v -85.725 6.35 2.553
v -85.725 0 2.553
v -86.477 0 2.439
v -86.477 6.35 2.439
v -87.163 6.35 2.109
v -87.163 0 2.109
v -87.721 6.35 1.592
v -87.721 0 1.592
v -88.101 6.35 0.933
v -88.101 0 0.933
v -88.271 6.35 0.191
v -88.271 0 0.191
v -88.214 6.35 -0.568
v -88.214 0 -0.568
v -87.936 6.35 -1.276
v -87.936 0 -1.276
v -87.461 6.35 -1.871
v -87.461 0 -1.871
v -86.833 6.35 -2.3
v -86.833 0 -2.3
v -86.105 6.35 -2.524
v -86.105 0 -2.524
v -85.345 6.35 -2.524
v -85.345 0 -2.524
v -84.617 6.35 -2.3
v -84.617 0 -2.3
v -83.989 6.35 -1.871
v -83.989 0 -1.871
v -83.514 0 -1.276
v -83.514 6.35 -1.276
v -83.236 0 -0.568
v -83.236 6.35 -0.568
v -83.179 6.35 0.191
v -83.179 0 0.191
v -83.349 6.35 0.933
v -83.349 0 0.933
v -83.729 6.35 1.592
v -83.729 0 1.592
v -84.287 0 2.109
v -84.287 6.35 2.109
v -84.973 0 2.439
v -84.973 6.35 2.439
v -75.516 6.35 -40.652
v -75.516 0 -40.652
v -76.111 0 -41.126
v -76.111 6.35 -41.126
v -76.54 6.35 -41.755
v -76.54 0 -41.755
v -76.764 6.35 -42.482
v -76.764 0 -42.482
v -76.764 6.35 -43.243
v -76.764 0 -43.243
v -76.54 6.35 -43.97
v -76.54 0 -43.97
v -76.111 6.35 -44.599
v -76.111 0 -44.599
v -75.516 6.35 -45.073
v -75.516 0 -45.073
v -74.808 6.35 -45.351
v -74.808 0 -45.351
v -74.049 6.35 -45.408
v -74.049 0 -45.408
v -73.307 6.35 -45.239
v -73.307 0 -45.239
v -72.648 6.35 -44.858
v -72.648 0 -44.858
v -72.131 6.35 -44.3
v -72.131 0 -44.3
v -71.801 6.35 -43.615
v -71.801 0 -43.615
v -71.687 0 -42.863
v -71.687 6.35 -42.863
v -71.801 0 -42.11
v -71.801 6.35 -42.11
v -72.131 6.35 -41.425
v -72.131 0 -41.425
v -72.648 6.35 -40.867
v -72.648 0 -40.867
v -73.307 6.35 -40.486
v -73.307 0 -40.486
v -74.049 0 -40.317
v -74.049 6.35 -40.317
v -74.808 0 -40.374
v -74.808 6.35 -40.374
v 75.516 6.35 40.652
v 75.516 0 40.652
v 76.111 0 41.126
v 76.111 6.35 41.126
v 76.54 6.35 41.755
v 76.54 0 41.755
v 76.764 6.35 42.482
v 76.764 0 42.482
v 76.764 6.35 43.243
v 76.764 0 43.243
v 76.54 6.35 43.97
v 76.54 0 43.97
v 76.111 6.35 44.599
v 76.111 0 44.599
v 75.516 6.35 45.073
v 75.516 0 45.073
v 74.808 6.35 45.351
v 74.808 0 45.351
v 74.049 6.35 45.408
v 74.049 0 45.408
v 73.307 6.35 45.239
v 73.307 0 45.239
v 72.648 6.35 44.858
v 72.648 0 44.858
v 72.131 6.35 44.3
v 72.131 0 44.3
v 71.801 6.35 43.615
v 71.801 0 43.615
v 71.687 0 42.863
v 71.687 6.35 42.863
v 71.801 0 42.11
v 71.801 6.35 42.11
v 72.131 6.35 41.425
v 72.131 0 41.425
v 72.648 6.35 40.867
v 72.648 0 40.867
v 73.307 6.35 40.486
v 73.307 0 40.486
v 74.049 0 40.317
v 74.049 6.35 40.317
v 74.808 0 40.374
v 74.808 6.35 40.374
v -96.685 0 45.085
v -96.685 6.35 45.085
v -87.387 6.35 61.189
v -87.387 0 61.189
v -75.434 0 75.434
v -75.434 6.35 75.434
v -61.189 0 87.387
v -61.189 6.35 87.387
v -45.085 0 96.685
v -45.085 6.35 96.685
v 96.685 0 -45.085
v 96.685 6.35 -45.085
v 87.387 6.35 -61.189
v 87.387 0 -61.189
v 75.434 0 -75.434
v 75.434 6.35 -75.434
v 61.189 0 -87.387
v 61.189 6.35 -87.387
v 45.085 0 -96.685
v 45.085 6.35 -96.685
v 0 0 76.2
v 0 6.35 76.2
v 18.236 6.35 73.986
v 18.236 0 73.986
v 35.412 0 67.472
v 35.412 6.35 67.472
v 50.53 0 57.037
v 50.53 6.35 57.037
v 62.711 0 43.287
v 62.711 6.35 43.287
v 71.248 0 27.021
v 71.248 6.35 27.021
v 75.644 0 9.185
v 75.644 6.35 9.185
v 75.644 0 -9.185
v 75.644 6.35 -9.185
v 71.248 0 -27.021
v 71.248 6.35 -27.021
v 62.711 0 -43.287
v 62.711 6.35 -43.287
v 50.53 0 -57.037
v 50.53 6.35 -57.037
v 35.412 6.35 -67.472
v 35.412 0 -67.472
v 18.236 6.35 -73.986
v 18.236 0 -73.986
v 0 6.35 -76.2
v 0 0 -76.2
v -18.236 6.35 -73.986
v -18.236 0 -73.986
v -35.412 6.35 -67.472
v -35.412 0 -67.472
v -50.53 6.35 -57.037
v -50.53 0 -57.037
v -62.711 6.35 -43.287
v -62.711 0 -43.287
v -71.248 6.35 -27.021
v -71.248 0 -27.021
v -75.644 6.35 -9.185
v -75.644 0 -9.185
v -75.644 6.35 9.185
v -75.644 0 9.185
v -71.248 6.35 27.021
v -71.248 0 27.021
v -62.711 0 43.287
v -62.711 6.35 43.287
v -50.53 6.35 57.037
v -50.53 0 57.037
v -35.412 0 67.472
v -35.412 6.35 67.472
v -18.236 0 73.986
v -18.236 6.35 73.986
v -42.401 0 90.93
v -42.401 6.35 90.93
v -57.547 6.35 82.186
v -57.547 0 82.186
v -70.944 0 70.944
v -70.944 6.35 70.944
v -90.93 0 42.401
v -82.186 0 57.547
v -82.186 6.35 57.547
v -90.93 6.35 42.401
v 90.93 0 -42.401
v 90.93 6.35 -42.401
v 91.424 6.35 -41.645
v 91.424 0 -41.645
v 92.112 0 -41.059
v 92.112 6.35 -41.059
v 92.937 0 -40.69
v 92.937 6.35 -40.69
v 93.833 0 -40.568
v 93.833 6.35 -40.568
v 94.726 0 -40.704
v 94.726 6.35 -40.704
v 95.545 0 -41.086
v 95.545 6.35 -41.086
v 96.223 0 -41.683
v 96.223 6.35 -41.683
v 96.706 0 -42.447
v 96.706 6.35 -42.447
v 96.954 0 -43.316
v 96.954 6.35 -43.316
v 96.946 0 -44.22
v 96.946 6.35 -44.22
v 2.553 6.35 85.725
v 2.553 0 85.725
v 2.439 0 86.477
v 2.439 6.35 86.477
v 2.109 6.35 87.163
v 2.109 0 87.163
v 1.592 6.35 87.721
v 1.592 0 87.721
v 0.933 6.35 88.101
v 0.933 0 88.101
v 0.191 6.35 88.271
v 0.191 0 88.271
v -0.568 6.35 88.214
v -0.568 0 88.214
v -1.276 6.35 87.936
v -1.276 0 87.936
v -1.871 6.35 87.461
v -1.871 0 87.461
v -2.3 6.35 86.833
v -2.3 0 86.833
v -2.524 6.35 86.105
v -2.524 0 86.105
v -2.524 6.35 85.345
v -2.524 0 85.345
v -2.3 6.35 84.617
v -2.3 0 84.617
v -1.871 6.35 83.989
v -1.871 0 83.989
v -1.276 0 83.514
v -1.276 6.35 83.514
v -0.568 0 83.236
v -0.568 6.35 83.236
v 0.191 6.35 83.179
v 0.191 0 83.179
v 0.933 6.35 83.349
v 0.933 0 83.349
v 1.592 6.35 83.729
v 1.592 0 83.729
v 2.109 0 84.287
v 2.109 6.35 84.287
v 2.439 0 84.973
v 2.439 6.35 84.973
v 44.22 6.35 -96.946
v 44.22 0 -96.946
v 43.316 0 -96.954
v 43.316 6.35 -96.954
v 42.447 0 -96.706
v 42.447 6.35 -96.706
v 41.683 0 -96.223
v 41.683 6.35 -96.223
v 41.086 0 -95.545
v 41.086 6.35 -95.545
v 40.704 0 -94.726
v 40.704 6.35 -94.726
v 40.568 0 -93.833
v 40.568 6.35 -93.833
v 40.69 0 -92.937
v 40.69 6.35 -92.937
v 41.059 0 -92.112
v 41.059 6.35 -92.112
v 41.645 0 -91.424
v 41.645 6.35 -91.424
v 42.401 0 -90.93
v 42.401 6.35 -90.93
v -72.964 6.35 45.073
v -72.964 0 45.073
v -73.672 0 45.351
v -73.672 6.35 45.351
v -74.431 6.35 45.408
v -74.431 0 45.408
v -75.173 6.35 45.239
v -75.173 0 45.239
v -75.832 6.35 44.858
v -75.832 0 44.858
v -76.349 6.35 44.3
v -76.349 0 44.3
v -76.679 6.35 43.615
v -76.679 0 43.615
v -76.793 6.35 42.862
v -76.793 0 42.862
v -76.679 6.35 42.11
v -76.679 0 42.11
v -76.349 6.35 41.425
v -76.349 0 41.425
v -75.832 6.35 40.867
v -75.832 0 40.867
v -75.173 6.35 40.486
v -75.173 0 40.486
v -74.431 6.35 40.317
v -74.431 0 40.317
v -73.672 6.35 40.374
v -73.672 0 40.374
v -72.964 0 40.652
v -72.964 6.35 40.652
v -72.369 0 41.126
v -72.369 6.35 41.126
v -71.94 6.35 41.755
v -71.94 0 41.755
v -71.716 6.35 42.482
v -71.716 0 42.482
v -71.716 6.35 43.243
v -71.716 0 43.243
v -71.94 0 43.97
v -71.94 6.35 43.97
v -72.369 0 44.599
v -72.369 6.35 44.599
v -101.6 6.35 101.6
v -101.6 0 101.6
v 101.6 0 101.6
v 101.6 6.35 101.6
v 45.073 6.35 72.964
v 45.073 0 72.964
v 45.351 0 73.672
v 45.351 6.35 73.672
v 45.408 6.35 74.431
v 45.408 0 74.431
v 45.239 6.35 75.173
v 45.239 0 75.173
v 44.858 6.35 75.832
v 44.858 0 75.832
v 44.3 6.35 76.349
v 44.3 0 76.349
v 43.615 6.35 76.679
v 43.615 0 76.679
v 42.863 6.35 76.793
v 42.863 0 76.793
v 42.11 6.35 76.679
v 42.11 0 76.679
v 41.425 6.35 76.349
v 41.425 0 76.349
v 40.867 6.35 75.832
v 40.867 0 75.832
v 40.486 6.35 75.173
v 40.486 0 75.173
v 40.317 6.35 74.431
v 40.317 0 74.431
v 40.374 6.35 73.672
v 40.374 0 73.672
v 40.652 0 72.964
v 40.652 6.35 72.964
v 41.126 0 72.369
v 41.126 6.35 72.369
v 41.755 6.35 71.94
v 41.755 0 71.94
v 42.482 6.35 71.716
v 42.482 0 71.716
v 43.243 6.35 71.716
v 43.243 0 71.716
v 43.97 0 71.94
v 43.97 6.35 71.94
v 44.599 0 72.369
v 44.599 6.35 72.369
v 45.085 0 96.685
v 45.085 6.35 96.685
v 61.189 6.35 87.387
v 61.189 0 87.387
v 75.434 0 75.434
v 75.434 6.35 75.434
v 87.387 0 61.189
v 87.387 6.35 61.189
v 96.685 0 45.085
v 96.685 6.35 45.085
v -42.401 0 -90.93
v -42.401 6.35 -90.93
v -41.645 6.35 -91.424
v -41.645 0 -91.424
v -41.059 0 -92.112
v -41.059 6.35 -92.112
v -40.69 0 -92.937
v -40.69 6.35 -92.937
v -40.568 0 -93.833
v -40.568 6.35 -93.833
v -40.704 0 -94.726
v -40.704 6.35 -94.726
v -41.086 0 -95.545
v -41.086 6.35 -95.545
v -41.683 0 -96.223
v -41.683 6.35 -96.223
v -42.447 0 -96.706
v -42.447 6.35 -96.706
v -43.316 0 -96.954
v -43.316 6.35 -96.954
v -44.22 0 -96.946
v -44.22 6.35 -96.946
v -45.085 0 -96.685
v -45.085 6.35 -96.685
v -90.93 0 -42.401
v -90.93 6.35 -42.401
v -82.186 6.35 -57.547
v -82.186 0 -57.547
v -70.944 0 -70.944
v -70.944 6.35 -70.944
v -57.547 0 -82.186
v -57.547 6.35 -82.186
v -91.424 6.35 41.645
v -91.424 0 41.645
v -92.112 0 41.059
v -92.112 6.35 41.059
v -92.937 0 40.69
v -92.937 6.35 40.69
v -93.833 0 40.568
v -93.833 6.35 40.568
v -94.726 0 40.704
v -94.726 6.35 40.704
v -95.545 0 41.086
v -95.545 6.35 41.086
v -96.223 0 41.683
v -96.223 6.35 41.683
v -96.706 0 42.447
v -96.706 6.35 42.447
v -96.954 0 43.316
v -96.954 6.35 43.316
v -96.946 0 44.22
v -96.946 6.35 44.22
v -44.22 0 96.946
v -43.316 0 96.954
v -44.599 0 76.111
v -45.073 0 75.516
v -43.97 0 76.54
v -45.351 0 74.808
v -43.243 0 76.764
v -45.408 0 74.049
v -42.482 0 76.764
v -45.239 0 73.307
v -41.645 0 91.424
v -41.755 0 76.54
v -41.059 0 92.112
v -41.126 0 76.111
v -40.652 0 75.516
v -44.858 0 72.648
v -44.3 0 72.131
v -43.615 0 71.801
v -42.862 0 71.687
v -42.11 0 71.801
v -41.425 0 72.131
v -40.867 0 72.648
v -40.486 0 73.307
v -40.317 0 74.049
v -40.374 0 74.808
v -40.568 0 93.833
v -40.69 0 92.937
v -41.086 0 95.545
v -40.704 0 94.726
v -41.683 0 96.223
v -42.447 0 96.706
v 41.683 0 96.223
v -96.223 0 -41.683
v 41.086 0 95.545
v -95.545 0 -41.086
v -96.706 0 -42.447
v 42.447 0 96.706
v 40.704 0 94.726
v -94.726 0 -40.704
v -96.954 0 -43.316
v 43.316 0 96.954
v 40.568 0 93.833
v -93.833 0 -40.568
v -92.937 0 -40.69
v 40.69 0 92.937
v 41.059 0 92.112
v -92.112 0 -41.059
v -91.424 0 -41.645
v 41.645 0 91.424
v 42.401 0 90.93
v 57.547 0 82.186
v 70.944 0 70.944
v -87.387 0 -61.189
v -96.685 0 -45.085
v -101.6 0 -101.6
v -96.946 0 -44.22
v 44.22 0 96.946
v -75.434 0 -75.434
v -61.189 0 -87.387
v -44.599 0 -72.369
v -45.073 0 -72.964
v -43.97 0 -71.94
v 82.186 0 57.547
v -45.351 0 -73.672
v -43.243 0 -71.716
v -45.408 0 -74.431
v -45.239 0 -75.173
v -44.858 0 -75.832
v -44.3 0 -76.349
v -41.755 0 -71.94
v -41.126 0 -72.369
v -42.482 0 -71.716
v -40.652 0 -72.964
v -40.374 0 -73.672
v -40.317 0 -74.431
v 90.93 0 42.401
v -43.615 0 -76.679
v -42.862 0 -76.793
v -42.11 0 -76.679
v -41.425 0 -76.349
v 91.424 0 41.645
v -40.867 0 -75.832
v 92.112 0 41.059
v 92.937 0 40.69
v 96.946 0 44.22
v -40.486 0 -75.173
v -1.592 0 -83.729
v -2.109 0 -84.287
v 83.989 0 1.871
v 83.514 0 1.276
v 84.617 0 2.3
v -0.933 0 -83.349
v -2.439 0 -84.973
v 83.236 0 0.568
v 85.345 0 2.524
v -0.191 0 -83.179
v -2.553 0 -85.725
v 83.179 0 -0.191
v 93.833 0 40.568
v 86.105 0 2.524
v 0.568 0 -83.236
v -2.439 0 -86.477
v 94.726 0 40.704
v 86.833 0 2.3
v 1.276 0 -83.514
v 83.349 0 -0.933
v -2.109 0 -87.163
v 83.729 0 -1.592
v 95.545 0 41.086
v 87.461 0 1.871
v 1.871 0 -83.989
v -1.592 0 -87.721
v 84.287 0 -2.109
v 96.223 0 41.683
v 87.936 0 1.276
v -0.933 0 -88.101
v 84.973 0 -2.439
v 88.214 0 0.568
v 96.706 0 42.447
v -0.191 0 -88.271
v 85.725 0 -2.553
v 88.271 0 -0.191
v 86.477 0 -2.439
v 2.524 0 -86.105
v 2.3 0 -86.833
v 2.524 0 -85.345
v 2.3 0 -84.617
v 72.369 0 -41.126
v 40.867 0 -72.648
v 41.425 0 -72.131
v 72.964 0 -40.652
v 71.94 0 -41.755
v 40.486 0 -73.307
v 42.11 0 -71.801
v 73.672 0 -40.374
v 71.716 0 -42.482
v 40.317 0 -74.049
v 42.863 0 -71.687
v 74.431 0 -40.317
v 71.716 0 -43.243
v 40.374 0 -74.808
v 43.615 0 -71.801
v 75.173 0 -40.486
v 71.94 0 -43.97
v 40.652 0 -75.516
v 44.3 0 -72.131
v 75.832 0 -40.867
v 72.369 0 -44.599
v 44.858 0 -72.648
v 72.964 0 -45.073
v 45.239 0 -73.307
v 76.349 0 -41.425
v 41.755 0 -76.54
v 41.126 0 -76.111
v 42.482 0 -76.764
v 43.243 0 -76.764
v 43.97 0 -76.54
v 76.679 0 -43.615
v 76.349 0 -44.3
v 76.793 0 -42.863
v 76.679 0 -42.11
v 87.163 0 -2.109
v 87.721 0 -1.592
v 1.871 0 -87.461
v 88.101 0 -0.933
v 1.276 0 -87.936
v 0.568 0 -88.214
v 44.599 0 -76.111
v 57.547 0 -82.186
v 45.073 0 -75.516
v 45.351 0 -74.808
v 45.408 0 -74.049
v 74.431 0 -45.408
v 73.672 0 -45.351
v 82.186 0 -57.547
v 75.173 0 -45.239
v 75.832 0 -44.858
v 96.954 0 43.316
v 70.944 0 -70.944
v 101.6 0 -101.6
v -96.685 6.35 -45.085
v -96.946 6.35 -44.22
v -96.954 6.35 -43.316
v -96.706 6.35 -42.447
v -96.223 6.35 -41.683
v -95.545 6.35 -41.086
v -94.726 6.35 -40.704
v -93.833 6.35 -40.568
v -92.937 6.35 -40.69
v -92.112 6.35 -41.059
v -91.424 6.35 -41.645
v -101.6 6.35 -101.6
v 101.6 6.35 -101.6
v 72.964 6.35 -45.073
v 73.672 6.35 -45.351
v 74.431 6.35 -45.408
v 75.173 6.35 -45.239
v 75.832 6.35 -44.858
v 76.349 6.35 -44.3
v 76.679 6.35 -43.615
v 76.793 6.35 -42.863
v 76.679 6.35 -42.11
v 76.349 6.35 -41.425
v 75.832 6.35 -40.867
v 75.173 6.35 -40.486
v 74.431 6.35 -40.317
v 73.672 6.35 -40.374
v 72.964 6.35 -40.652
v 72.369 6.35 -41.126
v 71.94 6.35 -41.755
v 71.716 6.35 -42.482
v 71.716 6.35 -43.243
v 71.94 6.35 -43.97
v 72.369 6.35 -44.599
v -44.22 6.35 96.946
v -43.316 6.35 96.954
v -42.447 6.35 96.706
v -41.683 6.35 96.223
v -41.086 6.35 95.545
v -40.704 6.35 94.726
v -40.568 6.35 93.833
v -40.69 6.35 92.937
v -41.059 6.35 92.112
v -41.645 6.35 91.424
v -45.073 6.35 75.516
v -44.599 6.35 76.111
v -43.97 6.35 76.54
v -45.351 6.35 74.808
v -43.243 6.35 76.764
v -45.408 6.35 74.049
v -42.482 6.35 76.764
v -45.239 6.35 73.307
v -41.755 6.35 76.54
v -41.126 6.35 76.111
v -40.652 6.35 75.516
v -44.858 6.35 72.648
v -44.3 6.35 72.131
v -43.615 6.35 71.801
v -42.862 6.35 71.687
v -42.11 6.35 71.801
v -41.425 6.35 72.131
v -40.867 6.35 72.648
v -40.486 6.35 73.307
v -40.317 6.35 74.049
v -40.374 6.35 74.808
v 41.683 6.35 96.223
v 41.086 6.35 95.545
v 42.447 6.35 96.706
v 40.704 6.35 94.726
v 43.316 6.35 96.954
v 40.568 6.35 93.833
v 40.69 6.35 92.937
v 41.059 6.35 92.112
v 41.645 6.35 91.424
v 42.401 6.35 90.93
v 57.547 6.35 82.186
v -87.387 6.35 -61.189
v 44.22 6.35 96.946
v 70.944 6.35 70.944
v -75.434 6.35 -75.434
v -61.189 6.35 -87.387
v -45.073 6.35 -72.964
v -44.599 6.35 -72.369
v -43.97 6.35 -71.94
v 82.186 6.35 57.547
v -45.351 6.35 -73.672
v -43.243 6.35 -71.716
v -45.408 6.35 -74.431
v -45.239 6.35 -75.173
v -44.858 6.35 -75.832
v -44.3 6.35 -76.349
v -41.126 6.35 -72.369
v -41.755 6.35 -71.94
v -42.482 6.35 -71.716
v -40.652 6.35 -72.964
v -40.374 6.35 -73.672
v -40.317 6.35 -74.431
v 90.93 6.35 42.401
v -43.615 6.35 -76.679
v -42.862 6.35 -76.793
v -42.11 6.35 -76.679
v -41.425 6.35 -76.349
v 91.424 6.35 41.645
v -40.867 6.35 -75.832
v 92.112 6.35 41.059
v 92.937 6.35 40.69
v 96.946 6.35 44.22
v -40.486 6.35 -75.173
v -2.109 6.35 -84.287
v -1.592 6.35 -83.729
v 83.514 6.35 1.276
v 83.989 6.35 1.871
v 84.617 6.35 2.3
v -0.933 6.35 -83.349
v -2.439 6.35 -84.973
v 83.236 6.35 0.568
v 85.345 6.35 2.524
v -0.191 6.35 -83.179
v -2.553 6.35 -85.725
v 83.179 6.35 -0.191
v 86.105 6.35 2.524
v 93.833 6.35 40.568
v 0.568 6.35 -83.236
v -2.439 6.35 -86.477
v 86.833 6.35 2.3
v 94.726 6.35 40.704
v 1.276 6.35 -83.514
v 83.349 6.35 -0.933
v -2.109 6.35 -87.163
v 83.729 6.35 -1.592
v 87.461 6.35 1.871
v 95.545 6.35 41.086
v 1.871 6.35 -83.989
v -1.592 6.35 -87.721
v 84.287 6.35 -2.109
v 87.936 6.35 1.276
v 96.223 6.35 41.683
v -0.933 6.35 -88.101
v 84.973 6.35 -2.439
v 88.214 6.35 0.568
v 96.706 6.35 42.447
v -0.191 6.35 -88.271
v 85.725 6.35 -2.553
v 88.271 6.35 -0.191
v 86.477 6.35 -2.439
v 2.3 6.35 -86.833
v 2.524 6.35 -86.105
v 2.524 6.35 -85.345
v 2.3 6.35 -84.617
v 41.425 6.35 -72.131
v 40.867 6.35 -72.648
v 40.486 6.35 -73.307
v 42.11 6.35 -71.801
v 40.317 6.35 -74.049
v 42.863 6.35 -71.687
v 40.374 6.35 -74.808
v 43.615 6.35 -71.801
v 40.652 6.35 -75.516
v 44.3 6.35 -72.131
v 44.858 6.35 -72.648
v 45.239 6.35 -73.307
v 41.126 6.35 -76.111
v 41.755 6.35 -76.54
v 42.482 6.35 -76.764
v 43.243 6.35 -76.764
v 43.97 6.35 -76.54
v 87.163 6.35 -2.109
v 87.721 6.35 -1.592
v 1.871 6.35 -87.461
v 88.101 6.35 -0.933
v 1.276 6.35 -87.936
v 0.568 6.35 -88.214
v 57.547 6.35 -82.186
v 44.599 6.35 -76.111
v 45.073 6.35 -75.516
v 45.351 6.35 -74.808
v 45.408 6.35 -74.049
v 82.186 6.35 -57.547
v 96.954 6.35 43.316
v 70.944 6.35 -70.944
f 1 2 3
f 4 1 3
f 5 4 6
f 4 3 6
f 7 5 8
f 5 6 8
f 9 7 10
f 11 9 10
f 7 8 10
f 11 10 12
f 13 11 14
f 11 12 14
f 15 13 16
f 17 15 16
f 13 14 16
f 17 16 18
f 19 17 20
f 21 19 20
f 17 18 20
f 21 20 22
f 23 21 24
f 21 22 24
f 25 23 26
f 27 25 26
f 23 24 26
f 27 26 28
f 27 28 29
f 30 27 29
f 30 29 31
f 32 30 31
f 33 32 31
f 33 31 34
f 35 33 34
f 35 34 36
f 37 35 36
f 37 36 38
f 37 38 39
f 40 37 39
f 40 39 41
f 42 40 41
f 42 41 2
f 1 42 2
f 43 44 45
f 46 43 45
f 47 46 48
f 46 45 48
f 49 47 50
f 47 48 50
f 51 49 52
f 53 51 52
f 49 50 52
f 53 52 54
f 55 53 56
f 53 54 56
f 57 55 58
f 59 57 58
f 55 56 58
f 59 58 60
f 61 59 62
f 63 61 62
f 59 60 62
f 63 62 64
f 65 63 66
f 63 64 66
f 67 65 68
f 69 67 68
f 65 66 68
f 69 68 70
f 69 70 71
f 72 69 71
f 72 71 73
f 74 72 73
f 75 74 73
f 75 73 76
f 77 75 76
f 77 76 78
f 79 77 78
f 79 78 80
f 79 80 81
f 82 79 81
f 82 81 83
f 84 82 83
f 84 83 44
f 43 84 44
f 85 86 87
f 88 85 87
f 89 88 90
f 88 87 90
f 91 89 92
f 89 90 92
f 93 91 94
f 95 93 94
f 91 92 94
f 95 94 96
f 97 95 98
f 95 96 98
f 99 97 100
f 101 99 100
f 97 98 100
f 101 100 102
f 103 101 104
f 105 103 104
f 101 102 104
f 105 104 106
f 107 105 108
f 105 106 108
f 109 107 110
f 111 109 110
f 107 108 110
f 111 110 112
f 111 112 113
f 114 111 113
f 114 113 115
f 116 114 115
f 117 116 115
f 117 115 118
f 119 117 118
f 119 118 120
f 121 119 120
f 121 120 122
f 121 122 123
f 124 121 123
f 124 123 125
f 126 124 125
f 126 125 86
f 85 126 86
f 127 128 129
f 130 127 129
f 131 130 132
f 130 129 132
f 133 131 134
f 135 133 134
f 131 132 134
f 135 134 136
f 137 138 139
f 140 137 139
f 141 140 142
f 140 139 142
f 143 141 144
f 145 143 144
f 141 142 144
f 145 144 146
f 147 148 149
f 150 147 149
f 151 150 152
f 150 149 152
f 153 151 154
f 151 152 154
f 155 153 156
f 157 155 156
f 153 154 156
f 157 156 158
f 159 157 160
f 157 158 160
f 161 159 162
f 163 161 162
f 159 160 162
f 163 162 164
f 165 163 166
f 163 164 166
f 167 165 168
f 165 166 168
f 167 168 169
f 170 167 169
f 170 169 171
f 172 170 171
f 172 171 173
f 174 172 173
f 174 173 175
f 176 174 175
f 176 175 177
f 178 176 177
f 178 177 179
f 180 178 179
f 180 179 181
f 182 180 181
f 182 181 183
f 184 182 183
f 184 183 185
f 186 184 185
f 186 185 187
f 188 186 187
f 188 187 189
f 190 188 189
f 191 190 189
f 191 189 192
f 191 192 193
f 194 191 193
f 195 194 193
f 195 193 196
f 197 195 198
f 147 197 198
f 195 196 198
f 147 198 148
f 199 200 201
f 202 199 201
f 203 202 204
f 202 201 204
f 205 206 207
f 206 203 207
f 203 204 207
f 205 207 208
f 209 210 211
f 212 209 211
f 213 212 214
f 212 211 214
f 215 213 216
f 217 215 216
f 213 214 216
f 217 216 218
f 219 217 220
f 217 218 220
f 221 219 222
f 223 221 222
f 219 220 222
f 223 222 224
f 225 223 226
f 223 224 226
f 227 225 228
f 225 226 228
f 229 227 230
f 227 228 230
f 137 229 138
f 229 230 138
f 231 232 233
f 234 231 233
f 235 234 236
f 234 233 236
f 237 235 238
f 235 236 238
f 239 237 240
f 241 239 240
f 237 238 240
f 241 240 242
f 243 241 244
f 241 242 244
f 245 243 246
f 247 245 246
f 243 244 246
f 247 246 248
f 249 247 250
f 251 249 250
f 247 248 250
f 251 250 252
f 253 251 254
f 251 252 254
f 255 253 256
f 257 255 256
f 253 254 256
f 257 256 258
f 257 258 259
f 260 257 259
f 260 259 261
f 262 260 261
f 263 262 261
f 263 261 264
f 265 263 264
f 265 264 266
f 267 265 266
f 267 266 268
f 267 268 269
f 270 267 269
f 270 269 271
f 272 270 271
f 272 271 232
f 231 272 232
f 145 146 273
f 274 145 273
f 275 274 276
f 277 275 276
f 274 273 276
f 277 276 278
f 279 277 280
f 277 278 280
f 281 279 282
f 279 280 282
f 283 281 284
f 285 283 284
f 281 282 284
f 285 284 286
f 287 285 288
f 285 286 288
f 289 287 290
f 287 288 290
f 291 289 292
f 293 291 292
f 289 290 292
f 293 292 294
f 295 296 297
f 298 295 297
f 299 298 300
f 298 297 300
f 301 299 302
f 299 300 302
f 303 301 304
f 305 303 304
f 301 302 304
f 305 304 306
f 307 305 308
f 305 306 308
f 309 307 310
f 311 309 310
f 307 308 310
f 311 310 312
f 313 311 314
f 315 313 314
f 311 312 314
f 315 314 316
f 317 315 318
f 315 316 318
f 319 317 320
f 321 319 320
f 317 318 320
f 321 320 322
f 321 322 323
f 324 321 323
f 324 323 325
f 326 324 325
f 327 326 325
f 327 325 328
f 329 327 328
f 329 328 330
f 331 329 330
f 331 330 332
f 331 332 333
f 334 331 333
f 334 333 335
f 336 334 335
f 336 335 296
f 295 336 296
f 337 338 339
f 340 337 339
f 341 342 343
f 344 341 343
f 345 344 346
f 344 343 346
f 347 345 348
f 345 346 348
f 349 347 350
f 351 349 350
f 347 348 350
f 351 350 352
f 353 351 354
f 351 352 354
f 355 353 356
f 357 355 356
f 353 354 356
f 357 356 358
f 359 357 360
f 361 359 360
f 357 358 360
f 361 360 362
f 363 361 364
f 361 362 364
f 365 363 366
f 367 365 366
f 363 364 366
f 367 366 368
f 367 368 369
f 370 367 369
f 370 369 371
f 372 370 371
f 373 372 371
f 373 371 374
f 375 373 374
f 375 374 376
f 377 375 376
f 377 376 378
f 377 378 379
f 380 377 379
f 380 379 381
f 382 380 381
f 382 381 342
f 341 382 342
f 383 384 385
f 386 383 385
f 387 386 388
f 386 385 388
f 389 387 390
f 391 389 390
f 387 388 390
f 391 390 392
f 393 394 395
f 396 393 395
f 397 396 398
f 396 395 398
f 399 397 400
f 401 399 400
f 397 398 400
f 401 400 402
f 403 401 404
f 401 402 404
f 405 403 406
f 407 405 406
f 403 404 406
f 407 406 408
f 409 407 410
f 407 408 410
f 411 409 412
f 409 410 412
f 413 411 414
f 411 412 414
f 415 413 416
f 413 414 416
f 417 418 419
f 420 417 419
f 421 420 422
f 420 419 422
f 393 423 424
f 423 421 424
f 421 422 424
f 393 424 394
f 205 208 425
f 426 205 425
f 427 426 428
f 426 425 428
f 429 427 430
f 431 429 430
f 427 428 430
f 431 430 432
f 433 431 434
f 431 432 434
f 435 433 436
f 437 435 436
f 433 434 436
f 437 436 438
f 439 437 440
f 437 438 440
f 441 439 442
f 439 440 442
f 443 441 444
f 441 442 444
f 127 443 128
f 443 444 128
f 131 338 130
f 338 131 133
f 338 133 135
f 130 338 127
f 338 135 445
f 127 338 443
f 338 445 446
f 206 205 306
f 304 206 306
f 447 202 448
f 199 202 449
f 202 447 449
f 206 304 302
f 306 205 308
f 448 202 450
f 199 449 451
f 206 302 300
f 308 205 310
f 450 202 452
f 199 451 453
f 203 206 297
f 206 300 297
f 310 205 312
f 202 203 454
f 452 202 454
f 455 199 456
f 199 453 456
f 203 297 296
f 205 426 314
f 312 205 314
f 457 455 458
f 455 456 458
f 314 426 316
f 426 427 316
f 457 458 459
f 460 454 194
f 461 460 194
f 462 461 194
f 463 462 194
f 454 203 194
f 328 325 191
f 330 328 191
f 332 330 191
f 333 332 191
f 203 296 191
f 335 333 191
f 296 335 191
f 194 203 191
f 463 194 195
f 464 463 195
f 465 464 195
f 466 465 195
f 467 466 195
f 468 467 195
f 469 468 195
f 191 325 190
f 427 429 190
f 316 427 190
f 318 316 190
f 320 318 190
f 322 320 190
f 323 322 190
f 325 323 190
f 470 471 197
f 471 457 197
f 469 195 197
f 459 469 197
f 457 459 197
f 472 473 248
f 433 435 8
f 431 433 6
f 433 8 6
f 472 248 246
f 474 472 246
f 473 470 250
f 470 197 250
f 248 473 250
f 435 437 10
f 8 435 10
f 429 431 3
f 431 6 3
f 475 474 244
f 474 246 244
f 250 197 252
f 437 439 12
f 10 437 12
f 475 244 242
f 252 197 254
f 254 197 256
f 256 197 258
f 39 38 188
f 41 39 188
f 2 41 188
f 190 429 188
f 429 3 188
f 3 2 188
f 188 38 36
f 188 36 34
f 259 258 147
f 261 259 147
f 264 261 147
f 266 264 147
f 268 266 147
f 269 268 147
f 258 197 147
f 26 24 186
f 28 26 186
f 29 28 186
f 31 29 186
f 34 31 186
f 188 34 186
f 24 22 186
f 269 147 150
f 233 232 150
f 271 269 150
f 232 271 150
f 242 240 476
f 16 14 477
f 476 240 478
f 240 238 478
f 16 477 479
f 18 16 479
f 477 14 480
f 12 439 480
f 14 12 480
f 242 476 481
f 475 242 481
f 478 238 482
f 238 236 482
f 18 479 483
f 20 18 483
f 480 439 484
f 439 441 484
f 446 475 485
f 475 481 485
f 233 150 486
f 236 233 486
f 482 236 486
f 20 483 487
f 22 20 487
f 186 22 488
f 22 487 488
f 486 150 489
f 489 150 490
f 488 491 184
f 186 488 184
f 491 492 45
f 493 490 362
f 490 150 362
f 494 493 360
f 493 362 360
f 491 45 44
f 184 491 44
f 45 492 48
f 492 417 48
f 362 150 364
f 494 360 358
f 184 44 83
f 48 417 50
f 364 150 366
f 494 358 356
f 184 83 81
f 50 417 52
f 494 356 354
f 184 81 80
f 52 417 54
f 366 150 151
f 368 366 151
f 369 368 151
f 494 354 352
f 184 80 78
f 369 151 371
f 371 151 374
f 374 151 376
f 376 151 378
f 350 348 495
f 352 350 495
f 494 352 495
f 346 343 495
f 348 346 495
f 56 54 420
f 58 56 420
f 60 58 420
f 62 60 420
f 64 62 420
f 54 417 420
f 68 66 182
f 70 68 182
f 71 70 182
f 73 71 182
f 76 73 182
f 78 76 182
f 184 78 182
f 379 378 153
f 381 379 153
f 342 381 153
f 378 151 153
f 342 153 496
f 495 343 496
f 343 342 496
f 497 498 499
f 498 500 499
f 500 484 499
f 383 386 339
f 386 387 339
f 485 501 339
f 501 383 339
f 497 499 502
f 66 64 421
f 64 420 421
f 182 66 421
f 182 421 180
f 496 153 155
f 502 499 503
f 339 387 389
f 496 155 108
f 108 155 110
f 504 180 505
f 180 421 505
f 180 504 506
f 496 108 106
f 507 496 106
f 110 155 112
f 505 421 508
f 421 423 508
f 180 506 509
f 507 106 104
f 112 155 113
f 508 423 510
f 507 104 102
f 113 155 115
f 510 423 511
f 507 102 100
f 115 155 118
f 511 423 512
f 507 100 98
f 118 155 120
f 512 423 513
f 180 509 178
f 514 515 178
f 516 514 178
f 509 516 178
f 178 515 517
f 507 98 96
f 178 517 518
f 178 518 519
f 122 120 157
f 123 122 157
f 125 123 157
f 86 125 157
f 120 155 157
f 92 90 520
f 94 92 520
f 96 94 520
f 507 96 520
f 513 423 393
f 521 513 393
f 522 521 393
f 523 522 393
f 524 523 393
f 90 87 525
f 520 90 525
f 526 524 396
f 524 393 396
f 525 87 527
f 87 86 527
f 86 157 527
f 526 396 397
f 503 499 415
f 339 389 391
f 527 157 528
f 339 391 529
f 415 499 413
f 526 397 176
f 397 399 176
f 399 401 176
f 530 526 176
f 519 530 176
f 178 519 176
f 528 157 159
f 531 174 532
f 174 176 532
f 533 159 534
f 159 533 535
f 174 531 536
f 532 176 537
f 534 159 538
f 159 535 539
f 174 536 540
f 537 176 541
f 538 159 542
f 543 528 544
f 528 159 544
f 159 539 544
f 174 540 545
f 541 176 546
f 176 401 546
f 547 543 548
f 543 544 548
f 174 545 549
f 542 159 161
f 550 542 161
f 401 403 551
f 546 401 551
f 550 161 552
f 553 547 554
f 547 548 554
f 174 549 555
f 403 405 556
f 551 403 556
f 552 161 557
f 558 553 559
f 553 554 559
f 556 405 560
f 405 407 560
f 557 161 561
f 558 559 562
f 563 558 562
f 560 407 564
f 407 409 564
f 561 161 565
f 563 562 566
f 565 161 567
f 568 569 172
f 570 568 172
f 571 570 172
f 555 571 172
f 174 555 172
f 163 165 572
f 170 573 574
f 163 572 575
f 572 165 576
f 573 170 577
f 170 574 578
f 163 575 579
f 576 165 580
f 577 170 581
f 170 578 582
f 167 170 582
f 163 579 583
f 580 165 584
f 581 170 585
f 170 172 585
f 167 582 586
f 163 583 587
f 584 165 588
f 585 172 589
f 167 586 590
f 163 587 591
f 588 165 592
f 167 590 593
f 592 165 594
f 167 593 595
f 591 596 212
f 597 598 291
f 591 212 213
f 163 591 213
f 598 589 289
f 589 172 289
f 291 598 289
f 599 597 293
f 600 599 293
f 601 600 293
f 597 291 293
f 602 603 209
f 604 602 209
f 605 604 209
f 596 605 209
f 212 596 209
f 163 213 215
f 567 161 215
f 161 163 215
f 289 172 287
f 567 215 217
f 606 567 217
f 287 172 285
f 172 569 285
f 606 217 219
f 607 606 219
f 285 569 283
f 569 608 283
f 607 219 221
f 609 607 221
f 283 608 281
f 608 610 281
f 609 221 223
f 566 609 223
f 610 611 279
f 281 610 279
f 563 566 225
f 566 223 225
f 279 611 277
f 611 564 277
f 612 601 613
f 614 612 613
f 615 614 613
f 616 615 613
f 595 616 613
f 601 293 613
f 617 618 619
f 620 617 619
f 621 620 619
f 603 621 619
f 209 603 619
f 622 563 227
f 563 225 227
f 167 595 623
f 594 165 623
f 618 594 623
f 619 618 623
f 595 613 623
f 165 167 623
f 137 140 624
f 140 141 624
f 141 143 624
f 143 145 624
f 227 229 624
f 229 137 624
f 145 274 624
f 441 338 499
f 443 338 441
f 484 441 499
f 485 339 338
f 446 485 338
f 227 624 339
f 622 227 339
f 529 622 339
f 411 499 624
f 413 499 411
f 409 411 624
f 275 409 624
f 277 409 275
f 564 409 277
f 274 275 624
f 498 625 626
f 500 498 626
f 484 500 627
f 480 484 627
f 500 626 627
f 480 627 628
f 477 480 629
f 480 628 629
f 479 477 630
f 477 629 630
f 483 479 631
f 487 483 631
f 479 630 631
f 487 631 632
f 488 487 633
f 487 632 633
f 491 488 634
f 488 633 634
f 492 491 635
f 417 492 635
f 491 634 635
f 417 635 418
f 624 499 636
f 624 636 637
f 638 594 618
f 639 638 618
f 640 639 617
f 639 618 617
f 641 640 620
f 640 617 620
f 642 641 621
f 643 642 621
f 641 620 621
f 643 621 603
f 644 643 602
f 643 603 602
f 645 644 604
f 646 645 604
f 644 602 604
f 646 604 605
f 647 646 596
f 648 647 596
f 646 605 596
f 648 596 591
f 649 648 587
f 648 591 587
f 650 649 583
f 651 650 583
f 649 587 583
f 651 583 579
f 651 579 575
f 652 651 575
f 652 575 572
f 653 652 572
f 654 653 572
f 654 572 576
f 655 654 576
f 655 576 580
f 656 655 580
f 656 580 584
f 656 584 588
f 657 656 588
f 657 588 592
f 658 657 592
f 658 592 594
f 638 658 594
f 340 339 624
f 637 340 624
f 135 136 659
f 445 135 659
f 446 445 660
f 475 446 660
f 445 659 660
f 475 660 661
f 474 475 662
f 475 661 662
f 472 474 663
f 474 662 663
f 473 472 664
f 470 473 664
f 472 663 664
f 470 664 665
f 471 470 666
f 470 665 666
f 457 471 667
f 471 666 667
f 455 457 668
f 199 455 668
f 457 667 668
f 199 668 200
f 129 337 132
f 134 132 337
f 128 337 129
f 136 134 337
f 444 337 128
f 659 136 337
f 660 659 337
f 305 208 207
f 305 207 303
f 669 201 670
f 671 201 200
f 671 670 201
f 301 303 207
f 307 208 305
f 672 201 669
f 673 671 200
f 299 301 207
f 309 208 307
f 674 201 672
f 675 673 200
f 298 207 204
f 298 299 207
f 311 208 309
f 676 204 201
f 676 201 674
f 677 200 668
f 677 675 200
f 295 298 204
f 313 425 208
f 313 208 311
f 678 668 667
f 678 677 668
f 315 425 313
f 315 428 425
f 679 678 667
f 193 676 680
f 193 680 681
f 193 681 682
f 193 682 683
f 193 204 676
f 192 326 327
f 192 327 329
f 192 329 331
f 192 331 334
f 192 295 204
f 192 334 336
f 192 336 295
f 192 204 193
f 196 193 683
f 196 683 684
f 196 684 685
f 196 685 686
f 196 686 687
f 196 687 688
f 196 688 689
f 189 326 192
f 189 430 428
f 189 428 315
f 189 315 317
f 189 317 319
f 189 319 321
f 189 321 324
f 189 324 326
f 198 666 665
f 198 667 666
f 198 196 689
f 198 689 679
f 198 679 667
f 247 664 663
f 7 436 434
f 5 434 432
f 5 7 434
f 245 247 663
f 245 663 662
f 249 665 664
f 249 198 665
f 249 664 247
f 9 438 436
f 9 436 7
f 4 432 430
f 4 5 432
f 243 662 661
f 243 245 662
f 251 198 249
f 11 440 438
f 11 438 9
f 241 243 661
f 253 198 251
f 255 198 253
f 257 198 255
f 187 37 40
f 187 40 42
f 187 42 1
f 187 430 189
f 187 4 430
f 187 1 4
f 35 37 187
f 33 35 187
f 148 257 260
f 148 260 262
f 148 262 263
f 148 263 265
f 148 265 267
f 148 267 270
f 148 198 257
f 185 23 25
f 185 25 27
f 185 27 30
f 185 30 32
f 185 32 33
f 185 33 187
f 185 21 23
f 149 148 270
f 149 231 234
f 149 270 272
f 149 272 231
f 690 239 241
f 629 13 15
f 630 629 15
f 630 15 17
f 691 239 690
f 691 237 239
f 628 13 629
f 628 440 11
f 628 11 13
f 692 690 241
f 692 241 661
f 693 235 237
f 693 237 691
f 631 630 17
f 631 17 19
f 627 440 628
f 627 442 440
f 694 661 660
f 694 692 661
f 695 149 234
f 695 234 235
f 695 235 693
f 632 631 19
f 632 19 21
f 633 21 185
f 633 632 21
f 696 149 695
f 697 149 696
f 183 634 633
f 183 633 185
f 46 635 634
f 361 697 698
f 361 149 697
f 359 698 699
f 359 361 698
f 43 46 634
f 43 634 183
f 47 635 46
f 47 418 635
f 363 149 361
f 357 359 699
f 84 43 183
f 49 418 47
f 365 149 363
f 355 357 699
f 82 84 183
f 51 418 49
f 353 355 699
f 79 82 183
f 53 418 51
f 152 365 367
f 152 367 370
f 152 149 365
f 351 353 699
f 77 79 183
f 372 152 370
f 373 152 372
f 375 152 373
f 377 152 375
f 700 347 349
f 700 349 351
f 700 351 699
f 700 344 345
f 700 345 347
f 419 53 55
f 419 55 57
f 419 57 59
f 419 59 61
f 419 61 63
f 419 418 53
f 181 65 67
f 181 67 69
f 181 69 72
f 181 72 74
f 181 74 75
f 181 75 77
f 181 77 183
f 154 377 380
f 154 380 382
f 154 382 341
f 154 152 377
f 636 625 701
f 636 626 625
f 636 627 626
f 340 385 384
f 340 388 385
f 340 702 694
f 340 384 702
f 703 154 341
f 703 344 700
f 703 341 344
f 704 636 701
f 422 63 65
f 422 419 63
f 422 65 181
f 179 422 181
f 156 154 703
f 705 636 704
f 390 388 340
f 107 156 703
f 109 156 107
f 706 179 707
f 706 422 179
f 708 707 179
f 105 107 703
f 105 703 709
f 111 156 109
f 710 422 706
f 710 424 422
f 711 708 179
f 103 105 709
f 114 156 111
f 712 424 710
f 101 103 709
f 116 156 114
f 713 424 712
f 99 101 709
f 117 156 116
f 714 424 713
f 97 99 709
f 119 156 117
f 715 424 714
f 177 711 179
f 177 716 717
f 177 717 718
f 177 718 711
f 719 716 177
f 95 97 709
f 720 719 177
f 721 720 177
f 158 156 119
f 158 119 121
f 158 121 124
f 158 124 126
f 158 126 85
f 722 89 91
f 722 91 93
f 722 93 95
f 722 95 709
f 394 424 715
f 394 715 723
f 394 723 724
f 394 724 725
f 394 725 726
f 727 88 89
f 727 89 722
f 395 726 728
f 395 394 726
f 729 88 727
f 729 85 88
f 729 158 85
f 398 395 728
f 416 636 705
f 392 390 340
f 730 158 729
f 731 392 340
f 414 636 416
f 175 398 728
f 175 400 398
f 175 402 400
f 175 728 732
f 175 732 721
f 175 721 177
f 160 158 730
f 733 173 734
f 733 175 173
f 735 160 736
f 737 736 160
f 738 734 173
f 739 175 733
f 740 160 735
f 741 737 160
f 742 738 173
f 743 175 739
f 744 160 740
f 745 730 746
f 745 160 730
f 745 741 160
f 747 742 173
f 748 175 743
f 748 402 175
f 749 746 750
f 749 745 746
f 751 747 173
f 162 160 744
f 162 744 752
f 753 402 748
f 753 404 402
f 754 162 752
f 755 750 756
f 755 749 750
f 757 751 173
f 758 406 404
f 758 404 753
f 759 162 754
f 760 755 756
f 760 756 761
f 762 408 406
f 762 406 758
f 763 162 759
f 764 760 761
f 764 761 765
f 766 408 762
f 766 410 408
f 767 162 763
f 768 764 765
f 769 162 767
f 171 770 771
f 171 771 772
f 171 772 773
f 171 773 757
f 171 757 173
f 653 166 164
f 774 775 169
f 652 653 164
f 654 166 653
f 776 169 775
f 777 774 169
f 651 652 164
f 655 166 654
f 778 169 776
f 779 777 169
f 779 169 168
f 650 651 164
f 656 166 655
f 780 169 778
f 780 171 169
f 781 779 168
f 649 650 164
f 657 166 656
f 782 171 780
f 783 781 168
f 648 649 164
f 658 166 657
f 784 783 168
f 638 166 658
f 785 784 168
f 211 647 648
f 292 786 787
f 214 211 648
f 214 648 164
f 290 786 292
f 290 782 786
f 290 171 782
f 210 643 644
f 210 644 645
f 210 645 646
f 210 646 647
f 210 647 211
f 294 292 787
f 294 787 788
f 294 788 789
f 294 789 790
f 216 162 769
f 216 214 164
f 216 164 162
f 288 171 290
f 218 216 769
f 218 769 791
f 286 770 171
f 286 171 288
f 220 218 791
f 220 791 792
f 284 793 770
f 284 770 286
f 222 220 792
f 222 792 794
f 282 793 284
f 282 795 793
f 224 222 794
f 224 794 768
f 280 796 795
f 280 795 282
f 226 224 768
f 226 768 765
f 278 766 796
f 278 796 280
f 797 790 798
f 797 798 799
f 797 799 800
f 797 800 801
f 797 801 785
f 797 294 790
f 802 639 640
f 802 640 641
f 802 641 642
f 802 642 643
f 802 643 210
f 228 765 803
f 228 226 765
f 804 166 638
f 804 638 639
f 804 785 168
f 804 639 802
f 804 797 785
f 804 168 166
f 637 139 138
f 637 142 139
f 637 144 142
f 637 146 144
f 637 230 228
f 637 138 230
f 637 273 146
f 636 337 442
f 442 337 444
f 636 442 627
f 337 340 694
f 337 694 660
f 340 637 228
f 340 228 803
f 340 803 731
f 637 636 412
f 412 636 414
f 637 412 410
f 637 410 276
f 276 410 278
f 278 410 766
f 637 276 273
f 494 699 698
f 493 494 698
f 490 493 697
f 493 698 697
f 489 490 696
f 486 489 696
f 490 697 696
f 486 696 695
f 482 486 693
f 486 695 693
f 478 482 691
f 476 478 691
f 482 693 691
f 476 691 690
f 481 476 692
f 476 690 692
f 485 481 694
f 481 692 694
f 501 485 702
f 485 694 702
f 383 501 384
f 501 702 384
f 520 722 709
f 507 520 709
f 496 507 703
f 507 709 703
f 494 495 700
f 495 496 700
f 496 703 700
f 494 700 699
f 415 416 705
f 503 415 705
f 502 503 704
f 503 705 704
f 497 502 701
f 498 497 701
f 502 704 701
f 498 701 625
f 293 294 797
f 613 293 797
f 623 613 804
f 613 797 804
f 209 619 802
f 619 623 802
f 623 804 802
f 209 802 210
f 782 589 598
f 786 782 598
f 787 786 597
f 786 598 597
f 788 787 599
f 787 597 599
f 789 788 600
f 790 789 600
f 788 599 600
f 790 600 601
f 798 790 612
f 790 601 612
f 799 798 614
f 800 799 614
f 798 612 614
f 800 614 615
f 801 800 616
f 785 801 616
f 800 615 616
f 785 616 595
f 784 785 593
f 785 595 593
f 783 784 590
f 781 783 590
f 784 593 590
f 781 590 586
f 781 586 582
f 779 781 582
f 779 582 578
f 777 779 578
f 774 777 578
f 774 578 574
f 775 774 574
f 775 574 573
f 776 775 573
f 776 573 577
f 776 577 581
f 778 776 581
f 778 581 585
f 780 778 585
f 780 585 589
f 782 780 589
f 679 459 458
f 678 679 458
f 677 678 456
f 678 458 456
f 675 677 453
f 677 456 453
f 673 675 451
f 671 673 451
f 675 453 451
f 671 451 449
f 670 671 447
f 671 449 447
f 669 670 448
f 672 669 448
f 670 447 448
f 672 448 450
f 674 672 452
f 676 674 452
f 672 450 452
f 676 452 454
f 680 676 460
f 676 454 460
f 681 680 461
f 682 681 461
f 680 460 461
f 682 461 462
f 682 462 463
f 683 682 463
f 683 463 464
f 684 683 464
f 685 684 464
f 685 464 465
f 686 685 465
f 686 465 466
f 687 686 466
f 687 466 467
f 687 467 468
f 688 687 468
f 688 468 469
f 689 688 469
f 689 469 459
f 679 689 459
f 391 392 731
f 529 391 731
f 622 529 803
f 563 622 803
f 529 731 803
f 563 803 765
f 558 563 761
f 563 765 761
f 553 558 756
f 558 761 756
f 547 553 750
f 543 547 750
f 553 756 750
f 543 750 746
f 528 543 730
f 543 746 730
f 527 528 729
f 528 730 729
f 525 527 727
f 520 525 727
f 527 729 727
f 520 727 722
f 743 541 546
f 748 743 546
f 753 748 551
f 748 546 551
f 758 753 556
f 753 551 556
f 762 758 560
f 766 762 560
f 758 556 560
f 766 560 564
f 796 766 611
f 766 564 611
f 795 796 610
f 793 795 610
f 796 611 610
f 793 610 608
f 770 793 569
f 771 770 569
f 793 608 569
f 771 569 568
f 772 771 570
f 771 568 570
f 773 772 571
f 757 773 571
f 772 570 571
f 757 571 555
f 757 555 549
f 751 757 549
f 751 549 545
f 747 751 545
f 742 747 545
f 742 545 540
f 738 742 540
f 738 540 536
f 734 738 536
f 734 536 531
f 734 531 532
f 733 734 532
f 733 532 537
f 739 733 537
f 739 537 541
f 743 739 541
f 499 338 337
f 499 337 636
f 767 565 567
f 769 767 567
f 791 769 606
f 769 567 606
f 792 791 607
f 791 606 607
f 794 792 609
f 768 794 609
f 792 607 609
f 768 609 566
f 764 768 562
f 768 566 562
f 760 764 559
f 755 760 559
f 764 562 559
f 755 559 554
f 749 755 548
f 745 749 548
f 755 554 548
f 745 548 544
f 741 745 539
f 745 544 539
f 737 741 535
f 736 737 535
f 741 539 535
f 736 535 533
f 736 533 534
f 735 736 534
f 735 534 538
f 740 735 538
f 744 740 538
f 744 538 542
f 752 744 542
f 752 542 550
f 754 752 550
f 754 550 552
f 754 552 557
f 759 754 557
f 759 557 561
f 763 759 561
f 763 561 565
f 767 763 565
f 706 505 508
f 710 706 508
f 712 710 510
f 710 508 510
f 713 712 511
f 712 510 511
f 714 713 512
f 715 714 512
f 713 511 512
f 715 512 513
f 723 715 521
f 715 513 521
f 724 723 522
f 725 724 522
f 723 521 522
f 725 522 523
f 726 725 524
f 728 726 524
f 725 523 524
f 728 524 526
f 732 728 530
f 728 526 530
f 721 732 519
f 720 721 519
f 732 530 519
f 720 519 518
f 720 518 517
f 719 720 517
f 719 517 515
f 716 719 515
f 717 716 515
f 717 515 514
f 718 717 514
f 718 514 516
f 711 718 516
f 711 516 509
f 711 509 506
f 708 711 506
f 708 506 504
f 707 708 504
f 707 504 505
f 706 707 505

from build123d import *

# Parameters (mm, degrees)
SKETCH1_W                   = 203.2
SKETCH1_H                   = 203.2
BOSS_EXTRUDE1_DEPTH         = 6.35
CUT_EXTRUDE1_REACH          = 8.35
SKETCH2_R                   = 76.2
F_1_4_20_TAPPED_HOLE1_D     = 5.1054
F_1_4_20_TAPPED_HOLE1_DEPTH = 6.351
CIRPATTERN1_COUNT           = 12
CUT_EXTRUDE2_REACH          = 8.35


with BuildPart() as part:
    # Sketch1 → Boss-Extrude1 (new body)
    with BuildSketch(Plane(origin=(0, 0, 0), x_dir=(1, 0, 0), z_dir=(0, 1, 0))):
        Rectangle(SKETCH1_W, SKETCH1_H)
    extrude(amount=BOSS_EXTRUDE1_DEPTH)

    # Sketch2 → Cut-Extrude1 (cut, up to next)
    with BuildSketch(Plane(origin=(0, 6.35, 0), x_dir=(1, 0, 0), z_dir=(0, 1, 0)), mode=Mode.PRIVATE) as cut_extrude1_sk1:
        with Locations(Location((0, 0, 0), (0, 0, 270))):  # turned: the seam where the file's is
            Circle(SKETCH2_R)
    cut_extrude1_tool1 = extrude(cut_extrude1_sk1.sketch, amount=-CUT_EXTRUDE1_REACH, mode=Mode.PRIVATE) & part.part
    add(cut_extrude1_tool1.solids().sort_by_distance((0, 6.35, 0))[0], mode=Mode.SUBTRACT)

    # 1/4-20 Tapped Hole1
    with Locations(Plane(origin=(0, 6.35, 0), x_dir=(1, 0, 0), z_dir=(0, 1, 0))):
        with Locations((0, 85.725)):
            f_1_4_20_tapped_hole1 = Hole(F_1_4_20_TAPPED_HOLE1_D / 2, depth=F_1_4_20_TAPPED_HOLE1_DEPTH)

    # CirPattern1: 1/4-20 Tapped Hole1 ×12 about axis
    cirpattern1_axis = Axis((0, 0, 0), (0, 1, 0))
    for i in range(1, CIRPATTERN1_COUNT):
        add(f_1_4_20_tapped_hole1.rotate(cirpattern1_axis, i * 360 / CIRPATTERN1_COUNT), mode=Mode.SUBTRACT)

    # Sketch5 → Cut-Extrude2 (cut, up to next)
    with BuildSketch(Plane(origin=(0, 6.35, 0), x_dir=(1, 0, 0), z_dir=(0, 1, 0)), mode=Mode.PRIVATE) as cut_extrude2_sk1:
        with BuildLine():
            ThreePointArc((-45.084916162, 96.684914721), (-75.434151417, 75.434151417), (-96.684914721, 45.084916162))
            ThreePointArc((-96.684914721, 45.084916162), (-95.149200478, 40.865575958), (-90.929860273, 42.4012902))
            ThreePointArc((-90.929860273, 42.4012902), (-70.944023356, 70.944023356), (-42.4012902, 90.929860273))
            ThreePointArc((-42.4012902, 90.929860273), (-40.865575958, 95.149200478), (-45.084916162, 96.684914721))
        make_face()
    cut_extrude2_tool1 = extrude(cut_extrude2_sk1.sketch, amount=-CUT_EXTRUDE2_REACH, mode=Mode.PRIVATE) & part.part
    add(cut_extrude2_tool1.solids().sort_by_distance((-71.522214, 6.35, -71.522214))[0], mode=Mode.SUBTRACT)
    # Sketch5 → Cut-Extrude2 (cut, up to next)
    with BuildSketch(Plane(origin=(0, 6.35, 0), x_dir=(1, 0, 0), z_dir=(0, 1, 0)), mode=Mode.PRIVATE) as cut_extrude2_sk2:
        with BuildLine():
            ThreePointArc((96.684914721, 45.084916162), (75.434151417, 75.434151417), (45.084916162, 96.684914721))
            ThreePointArc((45.084916162, 96.684914721), (40.865575958, 95.149200478), (42.4012902, 90.929860273))
            ThreePointArc((42.4012902, 90.929860273), (70.944023356, 70.944023356), (90.929860273, 42.4012902))
            ThreePointArc((90.929860273, 42.4012902), (95.149200478, 40.865575958), (96.684914721, 45.084916162))
        make_face()
    cut_extrude2_tool2 = extrude(cut_extrude2_sk2.sketch, amount=-CUT_EXTRUDE2_REACH, mode=Mode.PRIVATE) & part.part
    add(cut_extrude2_tool2.solids().sort_by_distance((71.522214, 6.35, -71.522214))[0], mode=Mode.SUBTRACT)
    # Sketch5 → Cut-Extrude2 (cut, up to next)
    with BuildSketch(Plane(origin=(0, 6.35, 0), x_dir=(1, 0, 0), z_dir=(0, 1, 0)), mode=Mode.PRIVATE) as cut_extrude2_sk3:
        with BuildLine():
            ThreePointArc((-96.684914721, -45.084916162), (-75.434151417, -75.434151417), (-45.084916162, -96.684914721))
            ThreePointArc((-45.084916162, -96.684914721), (-40.865575958, -95.149200478), (-42.4012902, -90.929860273))
            ThreePointArc((-42.4012902, -90.929860273), (-70.944023356, -70.944023356), (-90.929860273, -42.4012902))
            ThreePointArc((-90.929860273, -42.4012902), (-95.149200478, -40.865575958), (-96.684914721, -45.084916162))
        make_face()
    cut_extrude2_tool3 = extrude(cut_extrude2_sk3.sketch, amount=-CUT_EXTRUDE2_REACH, mode=Mode.PRIVATE) & part.part
    add(cut_extrude2_tool3.solids().sort_by_distance((-71.522214, 6.35, 71.522214))[0], mode=Mode.SUBTRACT)
    # Sketch5 → Cut-Extrude2 (cut, up to next)
    with BuildSketch(Plane(origin=(0, 6.35, 0), x_dir=(1, 0, 0), z_dir=(0, 1, 0)), mode=Mode.PRIVATE) as cut_extrude2_sk4:
        with BuildLine():
            ThreePointArc((45.084916162, -96.684914721), (75.434151417, -75.434151417), (96.684914721, -45.084916162))
            ThreePointArc((96.684914721, -45.084916162), (95.149200478, -40.865575958), (90.929860273, -42.4012902))
            ThreePointArc((90.929860273, -42.4012902), (70.944023356, -70.944023356), (42.4012902, -90.929860273))
            ThreePointArc((42.4012902, -90.929860273), (40.865575958, -95.149200478), (45.084916162, -96.684914721))
        make_face()
    cut_extrude2_tool4 = extrude(cut_extrude2_sk4.sketch, amount=-CUT_EXTRUDE2_REACH, mode=Mode.PRIVATE) & part.part
    add(cut_extrude2_tool4.solids().sort_by_distance((71.522214, 6.35, 71.522214))[0], mode=Mode.SUBTRACT)


solid = part.part
